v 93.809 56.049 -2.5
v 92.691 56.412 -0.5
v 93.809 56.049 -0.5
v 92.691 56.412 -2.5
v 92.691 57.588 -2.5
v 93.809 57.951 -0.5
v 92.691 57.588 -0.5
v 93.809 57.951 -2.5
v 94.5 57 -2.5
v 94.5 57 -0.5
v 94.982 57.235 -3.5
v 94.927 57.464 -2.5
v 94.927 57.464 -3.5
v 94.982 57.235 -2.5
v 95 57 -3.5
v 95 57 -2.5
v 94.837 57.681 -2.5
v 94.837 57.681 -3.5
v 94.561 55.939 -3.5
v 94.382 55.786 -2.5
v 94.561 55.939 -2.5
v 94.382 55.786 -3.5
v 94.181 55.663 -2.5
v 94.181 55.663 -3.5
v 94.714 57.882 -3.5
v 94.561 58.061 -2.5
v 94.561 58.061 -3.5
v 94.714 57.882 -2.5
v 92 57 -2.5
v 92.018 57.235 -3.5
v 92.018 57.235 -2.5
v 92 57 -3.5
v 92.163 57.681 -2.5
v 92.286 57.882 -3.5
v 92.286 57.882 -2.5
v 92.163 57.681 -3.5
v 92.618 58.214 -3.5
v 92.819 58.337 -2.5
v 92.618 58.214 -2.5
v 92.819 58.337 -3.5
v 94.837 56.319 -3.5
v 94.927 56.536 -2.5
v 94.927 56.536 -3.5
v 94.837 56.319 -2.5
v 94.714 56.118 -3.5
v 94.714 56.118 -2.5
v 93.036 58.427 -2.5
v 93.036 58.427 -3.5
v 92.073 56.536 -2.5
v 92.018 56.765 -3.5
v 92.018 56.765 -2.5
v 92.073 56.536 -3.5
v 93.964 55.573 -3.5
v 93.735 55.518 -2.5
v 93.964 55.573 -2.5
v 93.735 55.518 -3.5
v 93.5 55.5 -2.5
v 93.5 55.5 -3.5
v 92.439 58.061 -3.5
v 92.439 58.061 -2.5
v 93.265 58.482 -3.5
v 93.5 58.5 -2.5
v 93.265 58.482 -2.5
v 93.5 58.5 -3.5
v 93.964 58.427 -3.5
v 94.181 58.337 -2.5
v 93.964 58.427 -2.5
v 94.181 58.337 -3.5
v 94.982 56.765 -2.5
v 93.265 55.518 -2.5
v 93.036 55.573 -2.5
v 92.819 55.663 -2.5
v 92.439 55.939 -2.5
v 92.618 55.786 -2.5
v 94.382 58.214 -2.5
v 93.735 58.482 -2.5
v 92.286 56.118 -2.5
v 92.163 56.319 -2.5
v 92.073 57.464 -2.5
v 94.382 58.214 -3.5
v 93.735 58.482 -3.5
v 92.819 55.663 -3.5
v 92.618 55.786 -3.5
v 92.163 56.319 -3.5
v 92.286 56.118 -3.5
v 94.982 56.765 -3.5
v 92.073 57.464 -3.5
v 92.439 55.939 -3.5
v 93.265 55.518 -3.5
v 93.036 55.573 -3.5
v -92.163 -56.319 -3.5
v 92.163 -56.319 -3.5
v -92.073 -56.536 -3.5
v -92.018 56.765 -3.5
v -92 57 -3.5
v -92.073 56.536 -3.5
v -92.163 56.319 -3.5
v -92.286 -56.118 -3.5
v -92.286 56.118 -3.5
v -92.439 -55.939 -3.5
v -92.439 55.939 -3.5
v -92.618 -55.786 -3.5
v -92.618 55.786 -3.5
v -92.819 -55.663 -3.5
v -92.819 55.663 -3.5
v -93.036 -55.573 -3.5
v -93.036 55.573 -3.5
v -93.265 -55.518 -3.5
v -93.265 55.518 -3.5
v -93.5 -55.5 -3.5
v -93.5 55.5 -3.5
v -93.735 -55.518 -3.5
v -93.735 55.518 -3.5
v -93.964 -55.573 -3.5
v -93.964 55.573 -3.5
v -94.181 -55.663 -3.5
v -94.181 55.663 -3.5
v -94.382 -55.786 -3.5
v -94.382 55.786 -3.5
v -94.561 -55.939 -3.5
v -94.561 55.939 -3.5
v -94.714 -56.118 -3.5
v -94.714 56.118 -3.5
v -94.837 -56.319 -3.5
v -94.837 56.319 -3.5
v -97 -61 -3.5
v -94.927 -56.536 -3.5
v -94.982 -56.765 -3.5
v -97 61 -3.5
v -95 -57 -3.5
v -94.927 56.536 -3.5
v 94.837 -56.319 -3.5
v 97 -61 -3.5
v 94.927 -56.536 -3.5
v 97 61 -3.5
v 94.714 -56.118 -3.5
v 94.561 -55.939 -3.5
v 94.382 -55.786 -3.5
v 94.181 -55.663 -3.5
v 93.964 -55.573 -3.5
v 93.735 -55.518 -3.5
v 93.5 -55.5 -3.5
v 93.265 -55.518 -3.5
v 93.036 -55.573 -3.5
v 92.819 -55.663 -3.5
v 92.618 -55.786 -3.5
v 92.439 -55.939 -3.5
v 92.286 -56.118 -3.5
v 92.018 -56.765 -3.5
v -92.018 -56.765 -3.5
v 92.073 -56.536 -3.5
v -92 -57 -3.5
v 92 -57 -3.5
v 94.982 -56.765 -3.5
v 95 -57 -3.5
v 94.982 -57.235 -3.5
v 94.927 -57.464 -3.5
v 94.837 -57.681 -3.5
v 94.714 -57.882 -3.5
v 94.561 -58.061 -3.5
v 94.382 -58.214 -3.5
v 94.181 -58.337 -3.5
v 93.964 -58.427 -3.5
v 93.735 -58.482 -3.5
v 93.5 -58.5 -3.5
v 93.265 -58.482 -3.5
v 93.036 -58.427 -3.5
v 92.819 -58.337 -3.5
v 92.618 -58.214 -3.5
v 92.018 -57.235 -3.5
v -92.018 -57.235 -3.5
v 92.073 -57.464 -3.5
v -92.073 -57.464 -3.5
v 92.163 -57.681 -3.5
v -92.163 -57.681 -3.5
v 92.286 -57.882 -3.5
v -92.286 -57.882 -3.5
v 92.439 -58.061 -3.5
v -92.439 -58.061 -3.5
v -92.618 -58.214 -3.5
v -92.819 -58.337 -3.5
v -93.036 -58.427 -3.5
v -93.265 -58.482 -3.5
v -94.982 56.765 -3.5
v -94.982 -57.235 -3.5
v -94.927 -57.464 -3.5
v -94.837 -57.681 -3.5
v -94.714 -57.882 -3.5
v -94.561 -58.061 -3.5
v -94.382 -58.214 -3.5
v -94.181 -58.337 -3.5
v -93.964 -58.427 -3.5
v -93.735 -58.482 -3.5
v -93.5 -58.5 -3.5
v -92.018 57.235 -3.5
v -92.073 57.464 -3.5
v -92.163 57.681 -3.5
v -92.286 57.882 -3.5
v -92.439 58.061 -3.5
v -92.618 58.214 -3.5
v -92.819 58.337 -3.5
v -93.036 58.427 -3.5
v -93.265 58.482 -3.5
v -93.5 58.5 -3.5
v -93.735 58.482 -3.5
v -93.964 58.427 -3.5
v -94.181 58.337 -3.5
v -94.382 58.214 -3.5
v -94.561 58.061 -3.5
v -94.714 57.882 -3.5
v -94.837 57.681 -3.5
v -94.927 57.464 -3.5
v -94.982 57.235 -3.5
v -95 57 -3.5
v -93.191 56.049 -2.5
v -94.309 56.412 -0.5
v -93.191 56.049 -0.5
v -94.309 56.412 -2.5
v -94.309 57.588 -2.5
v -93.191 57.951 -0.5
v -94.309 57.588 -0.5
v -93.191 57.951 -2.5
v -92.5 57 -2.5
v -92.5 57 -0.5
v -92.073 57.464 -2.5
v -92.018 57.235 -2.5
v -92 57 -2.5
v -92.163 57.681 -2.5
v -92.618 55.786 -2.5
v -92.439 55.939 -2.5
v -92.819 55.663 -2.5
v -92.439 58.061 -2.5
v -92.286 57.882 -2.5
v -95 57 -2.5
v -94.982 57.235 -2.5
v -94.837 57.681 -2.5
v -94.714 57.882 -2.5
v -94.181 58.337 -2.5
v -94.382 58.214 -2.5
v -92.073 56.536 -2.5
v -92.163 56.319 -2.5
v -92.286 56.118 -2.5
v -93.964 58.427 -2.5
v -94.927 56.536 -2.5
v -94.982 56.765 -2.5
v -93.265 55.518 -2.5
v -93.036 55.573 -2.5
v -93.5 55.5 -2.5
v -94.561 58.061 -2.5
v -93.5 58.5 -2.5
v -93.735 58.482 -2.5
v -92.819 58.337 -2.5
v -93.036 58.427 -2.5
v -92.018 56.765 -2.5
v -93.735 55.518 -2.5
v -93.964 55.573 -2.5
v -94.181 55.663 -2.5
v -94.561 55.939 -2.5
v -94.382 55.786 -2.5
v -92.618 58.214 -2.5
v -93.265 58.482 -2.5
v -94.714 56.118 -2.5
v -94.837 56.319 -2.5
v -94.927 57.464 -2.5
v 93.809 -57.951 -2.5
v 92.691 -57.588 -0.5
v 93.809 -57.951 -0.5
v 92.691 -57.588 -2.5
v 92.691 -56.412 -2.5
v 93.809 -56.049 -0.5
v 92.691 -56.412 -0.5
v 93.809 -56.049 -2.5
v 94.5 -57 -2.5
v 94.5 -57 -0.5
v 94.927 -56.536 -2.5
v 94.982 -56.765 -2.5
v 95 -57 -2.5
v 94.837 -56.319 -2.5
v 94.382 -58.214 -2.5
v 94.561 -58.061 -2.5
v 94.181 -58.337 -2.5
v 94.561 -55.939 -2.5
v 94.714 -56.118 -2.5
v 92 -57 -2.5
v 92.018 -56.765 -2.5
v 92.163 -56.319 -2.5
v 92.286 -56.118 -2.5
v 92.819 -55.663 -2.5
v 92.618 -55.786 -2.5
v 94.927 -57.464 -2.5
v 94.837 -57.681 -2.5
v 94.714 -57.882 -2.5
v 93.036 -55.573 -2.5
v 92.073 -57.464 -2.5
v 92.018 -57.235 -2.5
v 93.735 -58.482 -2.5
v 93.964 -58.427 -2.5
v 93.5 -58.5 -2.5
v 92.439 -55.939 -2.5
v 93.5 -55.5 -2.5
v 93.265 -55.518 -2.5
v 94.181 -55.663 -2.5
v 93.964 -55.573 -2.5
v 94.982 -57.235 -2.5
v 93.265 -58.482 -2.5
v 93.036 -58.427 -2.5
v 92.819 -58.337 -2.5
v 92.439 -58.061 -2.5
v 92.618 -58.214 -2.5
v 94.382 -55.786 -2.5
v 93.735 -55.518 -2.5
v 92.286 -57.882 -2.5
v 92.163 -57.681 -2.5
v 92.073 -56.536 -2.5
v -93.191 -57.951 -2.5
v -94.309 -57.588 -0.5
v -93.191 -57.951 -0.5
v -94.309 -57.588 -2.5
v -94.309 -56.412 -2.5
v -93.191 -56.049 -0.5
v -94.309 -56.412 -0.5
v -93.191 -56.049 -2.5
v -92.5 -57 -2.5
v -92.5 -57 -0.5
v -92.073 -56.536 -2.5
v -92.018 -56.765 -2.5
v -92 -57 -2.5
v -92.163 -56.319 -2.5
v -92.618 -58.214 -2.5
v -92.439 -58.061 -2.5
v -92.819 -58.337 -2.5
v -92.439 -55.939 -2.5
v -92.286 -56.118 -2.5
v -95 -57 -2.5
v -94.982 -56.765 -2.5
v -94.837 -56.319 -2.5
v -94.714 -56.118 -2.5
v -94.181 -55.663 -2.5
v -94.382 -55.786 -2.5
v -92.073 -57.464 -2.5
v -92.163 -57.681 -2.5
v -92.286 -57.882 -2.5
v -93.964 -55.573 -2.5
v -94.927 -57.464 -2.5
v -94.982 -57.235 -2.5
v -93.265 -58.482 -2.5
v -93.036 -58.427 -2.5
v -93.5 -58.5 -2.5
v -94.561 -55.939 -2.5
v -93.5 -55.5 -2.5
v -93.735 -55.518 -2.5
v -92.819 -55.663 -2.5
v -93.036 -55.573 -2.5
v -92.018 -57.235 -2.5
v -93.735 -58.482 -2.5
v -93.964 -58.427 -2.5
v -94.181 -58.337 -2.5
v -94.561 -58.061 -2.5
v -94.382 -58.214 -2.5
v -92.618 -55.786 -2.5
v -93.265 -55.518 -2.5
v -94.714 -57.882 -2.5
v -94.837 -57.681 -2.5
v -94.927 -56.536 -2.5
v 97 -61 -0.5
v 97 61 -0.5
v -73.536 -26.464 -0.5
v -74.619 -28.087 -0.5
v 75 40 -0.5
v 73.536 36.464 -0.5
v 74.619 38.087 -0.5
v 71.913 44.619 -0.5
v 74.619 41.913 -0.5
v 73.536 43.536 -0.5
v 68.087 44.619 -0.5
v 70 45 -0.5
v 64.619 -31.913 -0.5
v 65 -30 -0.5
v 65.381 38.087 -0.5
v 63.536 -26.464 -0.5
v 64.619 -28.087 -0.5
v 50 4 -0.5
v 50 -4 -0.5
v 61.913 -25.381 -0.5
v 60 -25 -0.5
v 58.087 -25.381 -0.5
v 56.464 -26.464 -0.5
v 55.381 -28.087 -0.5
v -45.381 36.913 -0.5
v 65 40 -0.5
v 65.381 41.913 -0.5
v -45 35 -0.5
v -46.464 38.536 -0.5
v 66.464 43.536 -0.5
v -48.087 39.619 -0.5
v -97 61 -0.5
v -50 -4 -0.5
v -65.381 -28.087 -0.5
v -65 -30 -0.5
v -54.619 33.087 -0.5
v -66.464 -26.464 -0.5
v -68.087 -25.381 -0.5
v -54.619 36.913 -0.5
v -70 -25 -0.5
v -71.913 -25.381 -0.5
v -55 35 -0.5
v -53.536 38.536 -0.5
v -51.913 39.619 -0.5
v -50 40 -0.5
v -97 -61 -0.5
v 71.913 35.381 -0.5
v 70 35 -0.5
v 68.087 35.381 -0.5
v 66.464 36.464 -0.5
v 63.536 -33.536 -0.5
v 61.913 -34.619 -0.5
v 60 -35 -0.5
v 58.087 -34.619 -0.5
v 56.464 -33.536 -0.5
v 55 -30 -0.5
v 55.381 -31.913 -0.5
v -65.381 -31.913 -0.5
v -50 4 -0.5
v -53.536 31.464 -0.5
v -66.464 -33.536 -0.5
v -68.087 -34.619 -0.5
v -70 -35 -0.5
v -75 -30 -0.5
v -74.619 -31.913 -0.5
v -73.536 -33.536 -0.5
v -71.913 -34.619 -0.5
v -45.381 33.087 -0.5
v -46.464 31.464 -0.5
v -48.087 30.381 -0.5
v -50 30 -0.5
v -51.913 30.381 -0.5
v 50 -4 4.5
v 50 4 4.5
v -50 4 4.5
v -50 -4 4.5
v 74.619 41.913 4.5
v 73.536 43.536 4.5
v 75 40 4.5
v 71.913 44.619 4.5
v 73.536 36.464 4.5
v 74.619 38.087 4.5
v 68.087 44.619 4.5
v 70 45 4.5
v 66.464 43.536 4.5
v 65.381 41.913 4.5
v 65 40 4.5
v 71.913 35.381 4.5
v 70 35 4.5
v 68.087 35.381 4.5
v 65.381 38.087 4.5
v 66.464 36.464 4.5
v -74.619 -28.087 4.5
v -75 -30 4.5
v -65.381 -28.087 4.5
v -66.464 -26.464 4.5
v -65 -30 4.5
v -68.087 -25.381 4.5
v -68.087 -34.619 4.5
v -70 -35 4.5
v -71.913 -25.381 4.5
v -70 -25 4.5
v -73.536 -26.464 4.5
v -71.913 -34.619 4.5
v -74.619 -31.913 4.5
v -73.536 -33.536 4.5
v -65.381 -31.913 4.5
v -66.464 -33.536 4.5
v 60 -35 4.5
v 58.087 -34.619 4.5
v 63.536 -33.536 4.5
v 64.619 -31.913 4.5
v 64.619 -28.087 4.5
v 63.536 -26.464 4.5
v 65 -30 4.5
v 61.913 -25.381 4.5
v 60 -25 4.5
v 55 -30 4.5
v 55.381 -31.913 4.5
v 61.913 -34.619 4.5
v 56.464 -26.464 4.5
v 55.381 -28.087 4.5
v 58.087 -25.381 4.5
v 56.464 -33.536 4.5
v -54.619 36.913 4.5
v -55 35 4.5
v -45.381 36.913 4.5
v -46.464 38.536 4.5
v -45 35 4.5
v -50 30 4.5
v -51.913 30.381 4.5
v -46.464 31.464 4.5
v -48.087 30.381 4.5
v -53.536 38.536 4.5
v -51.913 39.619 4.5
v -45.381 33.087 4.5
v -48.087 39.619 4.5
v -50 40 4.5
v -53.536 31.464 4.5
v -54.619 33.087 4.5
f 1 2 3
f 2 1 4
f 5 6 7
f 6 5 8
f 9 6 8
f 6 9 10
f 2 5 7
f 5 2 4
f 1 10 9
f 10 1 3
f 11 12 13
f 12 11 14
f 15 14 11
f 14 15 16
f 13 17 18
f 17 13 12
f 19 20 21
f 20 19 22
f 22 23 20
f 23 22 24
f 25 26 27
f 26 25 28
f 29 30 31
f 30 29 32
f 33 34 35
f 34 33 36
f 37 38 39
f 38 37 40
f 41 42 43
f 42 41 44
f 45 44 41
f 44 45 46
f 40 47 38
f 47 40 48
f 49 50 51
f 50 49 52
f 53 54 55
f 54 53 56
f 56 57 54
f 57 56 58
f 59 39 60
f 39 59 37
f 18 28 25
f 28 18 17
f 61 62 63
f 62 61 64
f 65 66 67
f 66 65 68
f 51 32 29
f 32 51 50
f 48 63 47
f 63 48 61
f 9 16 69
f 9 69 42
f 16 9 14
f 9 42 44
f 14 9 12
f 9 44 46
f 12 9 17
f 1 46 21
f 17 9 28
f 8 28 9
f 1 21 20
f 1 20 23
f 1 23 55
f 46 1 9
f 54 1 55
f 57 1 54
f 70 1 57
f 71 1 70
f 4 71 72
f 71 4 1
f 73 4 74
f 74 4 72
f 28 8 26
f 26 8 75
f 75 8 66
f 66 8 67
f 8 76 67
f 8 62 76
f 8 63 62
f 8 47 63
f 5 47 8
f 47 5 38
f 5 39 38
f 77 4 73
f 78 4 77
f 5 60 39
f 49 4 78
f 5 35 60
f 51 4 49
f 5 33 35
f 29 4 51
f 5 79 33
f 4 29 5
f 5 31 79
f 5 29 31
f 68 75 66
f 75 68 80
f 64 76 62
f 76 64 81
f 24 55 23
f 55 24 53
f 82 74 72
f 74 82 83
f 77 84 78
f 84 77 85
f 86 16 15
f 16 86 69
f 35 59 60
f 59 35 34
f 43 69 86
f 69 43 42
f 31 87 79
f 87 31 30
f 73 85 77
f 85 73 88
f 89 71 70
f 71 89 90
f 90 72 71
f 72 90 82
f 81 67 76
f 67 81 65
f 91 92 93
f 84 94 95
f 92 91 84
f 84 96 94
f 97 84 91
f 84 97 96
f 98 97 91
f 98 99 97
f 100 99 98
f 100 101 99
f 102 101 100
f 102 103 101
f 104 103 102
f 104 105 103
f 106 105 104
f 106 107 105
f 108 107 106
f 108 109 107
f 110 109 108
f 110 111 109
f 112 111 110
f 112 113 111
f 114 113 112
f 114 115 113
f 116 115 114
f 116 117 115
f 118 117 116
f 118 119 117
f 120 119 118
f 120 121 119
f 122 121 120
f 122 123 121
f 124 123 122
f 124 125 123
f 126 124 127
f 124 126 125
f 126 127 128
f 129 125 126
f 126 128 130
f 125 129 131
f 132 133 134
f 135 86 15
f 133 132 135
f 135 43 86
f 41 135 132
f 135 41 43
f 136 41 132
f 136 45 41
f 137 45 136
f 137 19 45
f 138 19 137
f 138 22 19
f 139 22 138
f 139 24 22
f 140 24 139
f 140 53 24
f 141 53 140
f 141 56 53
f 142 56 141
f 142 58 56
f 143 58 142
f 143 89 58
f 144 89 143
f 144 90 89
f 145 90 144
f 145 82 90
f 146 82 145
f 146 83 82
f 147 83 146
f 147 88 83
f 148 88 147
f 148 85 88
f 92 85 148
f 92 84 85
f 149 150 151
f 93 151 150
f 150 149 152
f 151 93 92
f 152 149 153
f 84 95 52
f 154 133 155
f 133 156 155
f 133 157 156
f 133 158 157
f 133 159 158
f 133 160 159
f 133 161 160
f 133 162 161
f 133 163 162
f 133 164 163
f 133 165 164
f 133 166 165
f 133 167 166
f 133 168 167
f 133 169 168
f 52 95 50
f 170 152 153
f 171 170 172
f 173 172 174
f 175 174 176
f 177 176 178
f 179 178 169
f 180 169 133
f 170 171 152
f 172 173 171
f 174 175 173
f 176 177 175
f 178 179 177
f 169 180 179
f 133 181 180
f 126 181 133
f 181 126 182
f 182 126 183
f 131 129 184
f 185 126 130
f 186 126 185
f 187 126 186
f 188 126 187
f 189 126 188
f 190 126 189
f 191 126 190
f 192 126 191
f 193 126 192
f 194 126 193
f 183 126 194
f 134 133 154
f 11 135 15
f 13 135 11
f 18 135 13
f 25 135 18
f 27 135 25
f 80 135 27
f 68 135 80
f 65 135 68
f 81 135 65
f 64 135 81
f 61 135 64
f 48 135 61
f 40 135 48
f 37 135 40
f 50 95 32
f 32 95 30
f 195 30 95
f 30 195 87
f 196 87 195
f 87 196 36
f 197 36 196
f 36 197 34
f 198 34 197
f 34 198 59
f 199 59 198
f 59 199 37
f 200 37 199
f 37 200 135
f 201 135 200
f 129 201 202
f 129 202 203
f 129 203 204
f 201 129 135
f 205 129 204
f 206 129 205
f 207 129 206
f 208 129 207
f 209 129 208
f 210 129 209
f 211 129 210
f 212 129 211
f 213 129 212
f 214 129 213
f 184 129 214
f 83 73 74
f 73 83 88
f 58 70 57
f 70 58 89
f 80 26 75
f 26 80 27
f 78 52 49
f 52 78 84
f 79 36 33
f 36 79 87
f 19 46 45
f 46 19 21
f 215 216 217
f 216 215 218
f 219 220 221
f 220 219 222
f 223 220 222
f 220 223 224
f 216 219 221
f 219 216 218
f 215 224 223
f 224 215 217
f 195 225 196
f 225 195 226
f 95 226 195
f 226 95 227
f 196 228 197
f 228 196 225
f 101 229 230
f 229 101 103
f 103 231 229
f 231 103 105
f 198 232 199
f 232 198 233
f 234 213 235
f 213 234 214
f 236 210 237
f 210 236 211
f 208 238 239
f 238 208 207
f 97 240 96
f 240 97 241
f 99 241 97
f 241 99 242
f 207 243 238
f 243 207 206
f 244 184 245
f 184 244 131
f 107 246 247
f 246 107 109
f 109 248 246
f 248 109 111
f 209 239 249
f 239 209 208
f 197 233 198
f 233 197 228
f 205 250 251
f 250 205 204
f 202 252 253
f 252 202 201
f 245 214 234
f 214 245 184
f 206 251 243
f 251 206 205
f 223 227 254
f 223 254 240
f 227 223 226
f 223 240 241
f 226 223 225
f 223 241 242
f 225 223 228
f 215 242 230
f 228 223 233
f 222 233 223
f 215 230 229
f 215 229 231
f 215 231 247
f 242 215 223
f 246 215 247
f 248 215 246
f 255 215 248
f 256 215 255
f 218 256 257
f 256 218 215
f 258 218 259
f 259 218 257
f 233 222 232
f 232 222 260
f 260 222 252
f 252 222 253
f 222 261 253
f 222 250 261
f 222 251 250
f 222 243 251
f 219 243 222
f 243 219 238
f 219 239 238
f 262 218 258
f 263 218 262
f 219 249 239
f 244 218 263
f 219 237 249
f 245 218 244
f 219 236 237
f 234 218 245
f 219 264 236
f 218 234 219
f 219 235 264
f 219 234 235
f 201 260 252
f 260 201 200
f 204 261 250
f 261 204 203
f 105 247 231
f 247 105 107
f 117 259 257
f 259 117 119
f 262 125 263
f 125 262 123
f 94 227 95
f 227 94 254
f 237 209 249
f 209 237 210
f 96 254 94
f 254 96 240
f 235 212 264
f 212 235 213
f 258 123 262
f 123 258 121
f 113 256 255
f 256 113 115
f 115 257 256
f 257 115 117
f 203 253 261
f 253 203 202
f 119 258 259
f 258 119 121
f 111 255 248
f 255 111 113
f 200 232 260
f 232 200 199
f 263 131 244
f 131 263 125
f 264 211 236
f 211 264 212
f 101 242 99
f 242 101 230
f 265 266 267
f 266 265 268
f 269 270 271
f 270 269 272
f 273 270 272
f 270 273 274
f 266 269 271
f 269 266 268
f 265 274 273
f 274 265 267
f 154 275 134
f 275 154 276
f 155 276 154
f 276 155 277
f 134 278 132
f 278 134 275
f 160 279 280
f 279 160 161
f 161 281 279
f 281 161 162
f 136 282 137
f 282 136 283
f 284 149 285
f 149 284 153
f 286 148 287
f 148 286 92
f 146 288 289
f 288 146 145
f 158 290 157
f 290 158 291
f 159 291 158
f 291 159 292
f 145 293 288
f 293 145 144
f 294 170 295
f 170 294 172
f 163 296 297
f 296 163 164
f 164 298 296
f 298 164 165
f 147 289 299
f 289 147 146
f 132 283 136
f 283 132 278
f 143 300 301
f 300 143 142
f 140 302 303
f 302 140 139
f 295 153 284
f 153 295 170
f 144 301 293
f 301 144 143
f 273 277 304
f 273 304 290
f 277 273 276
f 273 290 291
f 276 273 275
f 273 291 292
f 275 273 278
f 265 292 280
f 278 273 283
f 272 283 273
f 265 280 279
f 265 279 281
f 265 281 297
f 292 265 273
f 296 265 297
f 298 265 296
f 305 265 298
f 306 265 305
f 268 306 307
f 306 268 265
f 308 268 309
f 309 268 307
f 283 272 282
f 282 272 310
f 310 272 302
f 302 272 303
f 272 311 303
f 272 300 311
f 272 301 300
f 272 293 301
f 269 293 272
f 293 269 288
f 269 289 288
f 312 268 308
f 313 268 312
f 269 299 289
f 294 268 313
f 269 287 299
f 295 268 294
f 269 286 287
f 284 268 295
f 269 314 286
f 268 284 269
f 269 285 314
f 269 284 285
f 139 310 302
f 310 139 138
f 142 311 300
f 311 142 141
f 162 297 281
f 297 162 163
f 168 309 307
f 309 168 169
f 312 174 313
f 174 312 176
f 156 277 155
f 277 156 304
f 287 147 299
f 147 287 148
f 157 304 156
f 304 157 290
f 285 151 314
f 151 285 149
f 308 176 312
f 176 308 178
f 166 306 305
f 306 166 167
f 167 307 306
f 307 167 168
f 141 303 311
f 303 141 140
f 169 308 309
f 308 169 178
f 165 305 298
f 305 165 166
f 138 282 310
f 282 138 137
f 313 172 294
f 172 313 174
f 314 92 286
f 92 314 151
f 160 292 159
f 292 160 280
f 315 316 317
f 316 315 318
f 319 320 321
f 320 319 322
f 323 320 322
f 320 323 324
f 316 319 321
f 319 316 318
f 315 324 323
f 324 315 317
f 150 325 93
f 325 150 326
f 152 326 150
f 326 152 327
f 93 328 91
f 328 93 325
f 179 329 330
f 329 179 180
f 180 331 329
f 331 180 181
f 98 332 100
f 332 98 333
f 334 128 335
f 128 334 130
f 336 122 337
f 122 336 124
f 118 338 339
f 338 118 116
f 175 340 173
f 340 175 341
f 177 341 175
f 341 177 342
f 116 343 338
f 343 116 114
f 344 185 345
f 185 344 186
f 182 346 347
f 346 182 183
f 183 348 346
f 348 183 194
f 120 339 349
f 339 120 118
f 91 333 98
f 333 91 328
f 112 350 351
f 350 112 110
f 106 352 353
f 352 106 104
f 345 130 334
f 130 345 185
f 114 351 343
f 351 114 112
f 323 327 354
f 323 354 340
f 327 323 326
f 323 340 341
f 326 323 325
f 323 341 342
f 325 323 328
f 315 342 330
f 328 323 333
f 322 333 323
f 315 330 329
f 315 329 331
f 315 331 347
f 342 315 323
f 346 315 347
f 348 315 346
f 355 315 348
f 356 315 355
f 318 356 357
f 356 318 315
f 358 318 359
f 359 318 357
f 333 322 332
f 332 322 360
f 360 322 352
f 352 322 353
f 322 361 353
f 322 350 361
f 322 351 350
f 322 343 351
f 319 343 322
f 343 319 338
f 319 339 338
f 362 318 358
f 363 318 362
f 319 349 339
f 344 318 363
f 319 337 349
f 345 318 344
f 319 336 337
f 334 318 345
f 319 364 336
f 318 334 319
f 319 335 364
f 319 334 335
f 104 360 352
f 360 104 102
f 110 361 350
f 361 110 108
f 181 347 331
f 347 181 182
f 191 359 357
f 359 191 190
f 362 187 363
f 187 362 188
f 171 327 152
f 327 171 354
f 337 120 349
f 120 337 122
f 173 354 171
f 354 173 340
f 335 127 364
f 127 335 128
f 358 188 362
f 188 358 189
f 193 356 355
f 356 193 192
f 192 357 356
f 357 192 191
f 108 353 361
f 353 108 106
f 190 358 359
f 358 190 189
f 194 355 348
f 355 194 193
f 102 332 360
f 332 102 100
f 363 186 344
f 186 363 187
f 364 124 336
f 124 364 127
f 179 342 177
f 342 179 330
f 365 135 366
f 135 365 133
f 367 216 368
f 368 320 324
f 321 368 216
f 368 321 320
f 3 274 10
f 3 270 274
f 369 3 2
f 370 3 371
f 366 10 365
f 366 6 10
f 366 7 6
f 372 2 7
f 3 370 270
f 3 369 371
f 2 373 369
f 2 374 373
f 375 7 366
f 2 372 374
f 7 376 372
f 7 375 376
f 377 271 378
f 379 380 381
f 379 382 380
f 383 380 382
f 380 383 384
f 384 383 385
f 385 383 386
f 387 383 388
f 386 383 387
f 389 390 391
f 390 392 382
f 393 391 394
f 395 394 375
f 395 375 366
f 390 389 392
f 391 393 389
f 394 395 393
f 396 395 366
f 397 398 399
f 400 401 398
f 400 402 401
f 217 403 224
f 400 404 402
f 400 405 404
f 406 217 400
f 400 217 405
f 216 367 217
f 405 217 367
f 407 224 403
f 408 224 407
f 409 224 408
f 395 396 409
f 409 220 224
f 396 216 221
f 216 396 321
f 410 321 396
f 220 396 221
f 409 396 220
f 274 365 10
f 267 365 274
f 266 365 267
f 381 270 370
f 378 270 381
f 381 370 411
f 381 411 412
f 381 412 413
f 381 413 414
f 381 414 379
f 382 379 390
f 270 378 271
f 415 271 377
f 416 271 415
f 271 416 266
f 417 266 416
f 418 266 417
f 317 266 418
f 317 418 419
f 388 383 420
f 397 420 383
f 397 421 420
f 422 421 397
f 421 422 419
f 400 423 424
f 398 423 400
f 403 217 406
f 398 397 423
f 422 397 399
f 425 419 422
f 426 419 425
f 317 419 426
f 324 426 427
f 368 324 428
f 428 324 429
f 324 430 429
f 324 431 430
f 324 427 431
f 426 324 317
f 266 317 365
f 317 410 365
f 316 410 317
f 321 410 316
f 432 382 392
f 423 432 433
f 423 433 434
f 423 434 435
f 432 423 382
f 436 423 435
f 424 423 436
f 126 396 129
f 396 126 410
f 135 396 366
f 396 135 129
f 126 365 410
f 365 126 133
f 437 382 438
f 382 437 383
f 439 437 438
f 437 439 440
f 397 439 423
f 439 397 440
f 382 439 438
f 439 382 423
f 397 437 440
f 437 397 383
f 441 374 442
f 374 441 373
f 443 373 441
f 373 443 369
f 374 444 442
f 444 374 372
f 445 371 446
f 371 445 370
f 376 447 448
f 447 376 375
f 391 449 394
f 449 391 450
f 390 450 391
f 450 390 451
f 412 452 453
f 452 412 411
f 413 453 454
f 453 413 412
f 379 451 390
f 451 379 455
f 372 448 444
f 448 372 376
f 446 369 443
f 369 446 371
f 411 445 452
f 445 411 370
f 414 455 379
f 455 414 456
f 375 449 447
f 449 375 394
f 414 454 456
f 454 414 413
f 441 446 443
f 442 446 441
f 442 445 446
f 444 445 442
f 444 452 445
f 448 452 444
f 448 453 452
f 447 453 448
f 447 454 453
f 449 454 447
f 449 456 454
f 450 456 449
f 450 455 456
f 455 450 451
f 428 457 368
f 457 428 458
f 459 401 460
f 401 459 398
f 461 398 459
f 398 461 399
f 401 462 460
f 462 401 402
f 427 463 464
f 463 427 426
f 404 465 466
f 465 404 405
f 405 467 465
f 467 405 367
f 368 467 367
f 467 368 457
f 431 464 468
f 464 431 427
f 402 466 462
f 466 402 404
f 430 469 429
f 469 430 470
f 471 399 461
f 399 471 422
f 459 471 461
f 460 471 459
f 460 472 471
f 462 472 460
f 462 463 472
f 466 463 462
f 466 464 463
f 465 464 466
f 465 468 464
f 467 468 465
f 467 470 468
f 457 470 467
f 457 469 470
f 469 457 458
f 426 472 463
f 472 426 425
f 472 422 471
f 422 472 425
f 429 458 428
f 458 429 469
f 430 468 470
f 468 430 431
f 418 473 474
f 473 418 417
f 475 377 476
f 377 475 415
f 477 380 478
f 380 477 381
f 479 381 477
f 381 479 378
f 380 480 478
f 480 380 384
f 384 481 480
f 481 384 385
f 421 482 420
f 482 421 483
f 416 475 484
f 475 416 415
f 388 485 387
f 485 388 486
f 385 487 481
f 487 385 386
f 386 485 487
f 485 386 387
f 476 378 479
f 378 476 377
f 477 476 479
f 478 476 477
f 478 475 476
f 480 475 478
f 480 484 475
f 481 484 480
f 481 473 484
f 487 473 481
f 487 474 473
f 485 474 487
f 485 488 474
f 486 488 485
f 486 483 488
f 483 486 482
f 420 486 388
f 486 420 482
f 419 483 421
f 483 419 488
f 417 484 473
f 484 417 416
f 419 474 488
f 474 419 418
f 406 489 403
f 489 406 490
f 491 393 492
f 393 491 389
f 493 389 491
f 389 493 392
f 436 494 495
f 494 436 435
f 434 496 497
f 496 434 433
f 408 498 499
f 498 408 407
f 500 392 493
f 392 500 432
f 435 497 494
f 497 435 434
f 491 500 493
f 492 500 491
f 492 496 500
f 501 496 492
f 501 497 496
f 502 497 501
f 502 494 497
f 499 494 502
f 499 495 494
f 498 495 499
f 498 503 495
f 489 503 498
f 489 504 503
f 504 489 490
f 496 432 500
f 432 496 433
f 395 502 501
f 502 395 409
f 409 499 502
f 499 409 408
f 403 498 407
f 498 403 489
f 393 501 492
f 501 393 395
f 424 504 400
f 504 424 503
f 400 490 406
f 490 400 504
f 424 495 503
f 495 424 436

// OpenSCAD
// Tims Display

Gehause = false;
Blende = true;

DisplayA = 174;
DisplayB = 102;
DisplayC = 13;

ScreenA = 166;  //155;
ScreenB = 101;  //87;
ScreenC = 7;

PlatineA = 182;
PlatineB = 109;
PlatineC = 8;
Platine = [PlatineA,PlatineB,PlatineC];

BlendeA = 155;
BlendeB = 87;
BlendeC = 2;

module Noppen() {

    translate([0,0,2])    
    cylinder(d=2.8,h=PlatineC+1,$fn=30);
}

module Bohrloch(Tief) {
    cylinder(d=2,h=5,center=true);
    if (Tief)
        translate([0,0,-1])
        cylinder(d=3,h=1,center=true,$fn=40);
}

module Blende(){
    translate([0,0,DisplayC-15])   
    {
    difference(){
        cube([DisplayA+20,DisplayB+20,3],center=true);
        translate([(PlatineA/2+2.5),(PlatineB/2+2.5),0])
        Bohrloch(true);

        translate([-(PlatineA/2+2.5),(PlatineB/2+2.5),0])
        Bohrloch(true);

        translate([(PlatineA/2+2.5),-(PlatineB/2+2.5),0])
        Bohrloch(true);

        translate([-(PlatineA/2+2.5),-(PlatineB/2+2.5),0])
        Bohrloch(true);
    
        }
    translate([0,0,4])
    cube([100,8,5],center=true);
        
    translate([70,40,4])
    cylinder(d=10,h=5,center=true);
        
    translate([-70,-30,4])
    cylinder(d=10,h=5,center=true);
        
    translate([60,-30,4])
    cylinder(d=10,h=5,center=true);
        
    translate([-50,35,4])
    cylinder(d=10,h=5,center=true);
    }
}

module Housing() {
    a= DisplayA+20;
    b= DisplayB+20;
    c= DisplayC;
    Screen=[ScreenA,ScreenB,ScreenC];
    
    difference(){
        translate([0,0,DisplayC/2])    
        cube([a,b,c],center=true);
        translate([0,0,ScreenC/2+PlatineC])
        cube(Screen,center=true);
//        translate([-3,-10,ScreenC/2+PlatineC])
//        cube(Screen,center=true);
        #translate([0,0,PlatineC/2])
        cube(Platine,center=true);
        
    }
}

module Gehause() {
    difference() {

        Housing();
        translate([0,ScreenB/2+1.5,PlatineC+(ScreenC-3)/2])
        cube([50,6,ScreenC-2],center=true);
        translate([-65,ScreenB/2+1.5,PlatineC+(ScreenC-3)/2])
        cube([25,6,ScreenC-2],center=true);
        color("Black")
        translate([-40,-PlatineB/2-5,PlatineC/2])
        cube([20,13,ScreenC],center=true);
        translate([PlatineA/2,0,PlatineC/2+1])
        cube([20,15,ScreenC+2],center=true);
        
        translate([PlatineA/2+2.5,PlatineB/2+2.5,0])
        Bohrloch(false);

        translate([-PlatineA/2-2.5,PlatineB/2+2.5,0])
        Bohrloch(false);

        translate([PlatineA/2+2.5,-PlatineB/2-2.5,0])
        Bohrloch(false);

        translate([-PlatineA/2-2.5,-PlatineB/2-2.5,0])
        Bohrloch(false);

    }

    translate([-DisplayA/2,-DisplayB/2,0])
    Noppen();
    translate([DisplayA/2,-DisplayB/2,0])
    Noppen();
    translate([DisplayA/2,DisplayB/2,0])
    Noppen();
    translate([-DisplayA/2,DisplayB/2,0])
    Noppen();
}
if (Gehause) Gehause();
if (Blende) Blende();
